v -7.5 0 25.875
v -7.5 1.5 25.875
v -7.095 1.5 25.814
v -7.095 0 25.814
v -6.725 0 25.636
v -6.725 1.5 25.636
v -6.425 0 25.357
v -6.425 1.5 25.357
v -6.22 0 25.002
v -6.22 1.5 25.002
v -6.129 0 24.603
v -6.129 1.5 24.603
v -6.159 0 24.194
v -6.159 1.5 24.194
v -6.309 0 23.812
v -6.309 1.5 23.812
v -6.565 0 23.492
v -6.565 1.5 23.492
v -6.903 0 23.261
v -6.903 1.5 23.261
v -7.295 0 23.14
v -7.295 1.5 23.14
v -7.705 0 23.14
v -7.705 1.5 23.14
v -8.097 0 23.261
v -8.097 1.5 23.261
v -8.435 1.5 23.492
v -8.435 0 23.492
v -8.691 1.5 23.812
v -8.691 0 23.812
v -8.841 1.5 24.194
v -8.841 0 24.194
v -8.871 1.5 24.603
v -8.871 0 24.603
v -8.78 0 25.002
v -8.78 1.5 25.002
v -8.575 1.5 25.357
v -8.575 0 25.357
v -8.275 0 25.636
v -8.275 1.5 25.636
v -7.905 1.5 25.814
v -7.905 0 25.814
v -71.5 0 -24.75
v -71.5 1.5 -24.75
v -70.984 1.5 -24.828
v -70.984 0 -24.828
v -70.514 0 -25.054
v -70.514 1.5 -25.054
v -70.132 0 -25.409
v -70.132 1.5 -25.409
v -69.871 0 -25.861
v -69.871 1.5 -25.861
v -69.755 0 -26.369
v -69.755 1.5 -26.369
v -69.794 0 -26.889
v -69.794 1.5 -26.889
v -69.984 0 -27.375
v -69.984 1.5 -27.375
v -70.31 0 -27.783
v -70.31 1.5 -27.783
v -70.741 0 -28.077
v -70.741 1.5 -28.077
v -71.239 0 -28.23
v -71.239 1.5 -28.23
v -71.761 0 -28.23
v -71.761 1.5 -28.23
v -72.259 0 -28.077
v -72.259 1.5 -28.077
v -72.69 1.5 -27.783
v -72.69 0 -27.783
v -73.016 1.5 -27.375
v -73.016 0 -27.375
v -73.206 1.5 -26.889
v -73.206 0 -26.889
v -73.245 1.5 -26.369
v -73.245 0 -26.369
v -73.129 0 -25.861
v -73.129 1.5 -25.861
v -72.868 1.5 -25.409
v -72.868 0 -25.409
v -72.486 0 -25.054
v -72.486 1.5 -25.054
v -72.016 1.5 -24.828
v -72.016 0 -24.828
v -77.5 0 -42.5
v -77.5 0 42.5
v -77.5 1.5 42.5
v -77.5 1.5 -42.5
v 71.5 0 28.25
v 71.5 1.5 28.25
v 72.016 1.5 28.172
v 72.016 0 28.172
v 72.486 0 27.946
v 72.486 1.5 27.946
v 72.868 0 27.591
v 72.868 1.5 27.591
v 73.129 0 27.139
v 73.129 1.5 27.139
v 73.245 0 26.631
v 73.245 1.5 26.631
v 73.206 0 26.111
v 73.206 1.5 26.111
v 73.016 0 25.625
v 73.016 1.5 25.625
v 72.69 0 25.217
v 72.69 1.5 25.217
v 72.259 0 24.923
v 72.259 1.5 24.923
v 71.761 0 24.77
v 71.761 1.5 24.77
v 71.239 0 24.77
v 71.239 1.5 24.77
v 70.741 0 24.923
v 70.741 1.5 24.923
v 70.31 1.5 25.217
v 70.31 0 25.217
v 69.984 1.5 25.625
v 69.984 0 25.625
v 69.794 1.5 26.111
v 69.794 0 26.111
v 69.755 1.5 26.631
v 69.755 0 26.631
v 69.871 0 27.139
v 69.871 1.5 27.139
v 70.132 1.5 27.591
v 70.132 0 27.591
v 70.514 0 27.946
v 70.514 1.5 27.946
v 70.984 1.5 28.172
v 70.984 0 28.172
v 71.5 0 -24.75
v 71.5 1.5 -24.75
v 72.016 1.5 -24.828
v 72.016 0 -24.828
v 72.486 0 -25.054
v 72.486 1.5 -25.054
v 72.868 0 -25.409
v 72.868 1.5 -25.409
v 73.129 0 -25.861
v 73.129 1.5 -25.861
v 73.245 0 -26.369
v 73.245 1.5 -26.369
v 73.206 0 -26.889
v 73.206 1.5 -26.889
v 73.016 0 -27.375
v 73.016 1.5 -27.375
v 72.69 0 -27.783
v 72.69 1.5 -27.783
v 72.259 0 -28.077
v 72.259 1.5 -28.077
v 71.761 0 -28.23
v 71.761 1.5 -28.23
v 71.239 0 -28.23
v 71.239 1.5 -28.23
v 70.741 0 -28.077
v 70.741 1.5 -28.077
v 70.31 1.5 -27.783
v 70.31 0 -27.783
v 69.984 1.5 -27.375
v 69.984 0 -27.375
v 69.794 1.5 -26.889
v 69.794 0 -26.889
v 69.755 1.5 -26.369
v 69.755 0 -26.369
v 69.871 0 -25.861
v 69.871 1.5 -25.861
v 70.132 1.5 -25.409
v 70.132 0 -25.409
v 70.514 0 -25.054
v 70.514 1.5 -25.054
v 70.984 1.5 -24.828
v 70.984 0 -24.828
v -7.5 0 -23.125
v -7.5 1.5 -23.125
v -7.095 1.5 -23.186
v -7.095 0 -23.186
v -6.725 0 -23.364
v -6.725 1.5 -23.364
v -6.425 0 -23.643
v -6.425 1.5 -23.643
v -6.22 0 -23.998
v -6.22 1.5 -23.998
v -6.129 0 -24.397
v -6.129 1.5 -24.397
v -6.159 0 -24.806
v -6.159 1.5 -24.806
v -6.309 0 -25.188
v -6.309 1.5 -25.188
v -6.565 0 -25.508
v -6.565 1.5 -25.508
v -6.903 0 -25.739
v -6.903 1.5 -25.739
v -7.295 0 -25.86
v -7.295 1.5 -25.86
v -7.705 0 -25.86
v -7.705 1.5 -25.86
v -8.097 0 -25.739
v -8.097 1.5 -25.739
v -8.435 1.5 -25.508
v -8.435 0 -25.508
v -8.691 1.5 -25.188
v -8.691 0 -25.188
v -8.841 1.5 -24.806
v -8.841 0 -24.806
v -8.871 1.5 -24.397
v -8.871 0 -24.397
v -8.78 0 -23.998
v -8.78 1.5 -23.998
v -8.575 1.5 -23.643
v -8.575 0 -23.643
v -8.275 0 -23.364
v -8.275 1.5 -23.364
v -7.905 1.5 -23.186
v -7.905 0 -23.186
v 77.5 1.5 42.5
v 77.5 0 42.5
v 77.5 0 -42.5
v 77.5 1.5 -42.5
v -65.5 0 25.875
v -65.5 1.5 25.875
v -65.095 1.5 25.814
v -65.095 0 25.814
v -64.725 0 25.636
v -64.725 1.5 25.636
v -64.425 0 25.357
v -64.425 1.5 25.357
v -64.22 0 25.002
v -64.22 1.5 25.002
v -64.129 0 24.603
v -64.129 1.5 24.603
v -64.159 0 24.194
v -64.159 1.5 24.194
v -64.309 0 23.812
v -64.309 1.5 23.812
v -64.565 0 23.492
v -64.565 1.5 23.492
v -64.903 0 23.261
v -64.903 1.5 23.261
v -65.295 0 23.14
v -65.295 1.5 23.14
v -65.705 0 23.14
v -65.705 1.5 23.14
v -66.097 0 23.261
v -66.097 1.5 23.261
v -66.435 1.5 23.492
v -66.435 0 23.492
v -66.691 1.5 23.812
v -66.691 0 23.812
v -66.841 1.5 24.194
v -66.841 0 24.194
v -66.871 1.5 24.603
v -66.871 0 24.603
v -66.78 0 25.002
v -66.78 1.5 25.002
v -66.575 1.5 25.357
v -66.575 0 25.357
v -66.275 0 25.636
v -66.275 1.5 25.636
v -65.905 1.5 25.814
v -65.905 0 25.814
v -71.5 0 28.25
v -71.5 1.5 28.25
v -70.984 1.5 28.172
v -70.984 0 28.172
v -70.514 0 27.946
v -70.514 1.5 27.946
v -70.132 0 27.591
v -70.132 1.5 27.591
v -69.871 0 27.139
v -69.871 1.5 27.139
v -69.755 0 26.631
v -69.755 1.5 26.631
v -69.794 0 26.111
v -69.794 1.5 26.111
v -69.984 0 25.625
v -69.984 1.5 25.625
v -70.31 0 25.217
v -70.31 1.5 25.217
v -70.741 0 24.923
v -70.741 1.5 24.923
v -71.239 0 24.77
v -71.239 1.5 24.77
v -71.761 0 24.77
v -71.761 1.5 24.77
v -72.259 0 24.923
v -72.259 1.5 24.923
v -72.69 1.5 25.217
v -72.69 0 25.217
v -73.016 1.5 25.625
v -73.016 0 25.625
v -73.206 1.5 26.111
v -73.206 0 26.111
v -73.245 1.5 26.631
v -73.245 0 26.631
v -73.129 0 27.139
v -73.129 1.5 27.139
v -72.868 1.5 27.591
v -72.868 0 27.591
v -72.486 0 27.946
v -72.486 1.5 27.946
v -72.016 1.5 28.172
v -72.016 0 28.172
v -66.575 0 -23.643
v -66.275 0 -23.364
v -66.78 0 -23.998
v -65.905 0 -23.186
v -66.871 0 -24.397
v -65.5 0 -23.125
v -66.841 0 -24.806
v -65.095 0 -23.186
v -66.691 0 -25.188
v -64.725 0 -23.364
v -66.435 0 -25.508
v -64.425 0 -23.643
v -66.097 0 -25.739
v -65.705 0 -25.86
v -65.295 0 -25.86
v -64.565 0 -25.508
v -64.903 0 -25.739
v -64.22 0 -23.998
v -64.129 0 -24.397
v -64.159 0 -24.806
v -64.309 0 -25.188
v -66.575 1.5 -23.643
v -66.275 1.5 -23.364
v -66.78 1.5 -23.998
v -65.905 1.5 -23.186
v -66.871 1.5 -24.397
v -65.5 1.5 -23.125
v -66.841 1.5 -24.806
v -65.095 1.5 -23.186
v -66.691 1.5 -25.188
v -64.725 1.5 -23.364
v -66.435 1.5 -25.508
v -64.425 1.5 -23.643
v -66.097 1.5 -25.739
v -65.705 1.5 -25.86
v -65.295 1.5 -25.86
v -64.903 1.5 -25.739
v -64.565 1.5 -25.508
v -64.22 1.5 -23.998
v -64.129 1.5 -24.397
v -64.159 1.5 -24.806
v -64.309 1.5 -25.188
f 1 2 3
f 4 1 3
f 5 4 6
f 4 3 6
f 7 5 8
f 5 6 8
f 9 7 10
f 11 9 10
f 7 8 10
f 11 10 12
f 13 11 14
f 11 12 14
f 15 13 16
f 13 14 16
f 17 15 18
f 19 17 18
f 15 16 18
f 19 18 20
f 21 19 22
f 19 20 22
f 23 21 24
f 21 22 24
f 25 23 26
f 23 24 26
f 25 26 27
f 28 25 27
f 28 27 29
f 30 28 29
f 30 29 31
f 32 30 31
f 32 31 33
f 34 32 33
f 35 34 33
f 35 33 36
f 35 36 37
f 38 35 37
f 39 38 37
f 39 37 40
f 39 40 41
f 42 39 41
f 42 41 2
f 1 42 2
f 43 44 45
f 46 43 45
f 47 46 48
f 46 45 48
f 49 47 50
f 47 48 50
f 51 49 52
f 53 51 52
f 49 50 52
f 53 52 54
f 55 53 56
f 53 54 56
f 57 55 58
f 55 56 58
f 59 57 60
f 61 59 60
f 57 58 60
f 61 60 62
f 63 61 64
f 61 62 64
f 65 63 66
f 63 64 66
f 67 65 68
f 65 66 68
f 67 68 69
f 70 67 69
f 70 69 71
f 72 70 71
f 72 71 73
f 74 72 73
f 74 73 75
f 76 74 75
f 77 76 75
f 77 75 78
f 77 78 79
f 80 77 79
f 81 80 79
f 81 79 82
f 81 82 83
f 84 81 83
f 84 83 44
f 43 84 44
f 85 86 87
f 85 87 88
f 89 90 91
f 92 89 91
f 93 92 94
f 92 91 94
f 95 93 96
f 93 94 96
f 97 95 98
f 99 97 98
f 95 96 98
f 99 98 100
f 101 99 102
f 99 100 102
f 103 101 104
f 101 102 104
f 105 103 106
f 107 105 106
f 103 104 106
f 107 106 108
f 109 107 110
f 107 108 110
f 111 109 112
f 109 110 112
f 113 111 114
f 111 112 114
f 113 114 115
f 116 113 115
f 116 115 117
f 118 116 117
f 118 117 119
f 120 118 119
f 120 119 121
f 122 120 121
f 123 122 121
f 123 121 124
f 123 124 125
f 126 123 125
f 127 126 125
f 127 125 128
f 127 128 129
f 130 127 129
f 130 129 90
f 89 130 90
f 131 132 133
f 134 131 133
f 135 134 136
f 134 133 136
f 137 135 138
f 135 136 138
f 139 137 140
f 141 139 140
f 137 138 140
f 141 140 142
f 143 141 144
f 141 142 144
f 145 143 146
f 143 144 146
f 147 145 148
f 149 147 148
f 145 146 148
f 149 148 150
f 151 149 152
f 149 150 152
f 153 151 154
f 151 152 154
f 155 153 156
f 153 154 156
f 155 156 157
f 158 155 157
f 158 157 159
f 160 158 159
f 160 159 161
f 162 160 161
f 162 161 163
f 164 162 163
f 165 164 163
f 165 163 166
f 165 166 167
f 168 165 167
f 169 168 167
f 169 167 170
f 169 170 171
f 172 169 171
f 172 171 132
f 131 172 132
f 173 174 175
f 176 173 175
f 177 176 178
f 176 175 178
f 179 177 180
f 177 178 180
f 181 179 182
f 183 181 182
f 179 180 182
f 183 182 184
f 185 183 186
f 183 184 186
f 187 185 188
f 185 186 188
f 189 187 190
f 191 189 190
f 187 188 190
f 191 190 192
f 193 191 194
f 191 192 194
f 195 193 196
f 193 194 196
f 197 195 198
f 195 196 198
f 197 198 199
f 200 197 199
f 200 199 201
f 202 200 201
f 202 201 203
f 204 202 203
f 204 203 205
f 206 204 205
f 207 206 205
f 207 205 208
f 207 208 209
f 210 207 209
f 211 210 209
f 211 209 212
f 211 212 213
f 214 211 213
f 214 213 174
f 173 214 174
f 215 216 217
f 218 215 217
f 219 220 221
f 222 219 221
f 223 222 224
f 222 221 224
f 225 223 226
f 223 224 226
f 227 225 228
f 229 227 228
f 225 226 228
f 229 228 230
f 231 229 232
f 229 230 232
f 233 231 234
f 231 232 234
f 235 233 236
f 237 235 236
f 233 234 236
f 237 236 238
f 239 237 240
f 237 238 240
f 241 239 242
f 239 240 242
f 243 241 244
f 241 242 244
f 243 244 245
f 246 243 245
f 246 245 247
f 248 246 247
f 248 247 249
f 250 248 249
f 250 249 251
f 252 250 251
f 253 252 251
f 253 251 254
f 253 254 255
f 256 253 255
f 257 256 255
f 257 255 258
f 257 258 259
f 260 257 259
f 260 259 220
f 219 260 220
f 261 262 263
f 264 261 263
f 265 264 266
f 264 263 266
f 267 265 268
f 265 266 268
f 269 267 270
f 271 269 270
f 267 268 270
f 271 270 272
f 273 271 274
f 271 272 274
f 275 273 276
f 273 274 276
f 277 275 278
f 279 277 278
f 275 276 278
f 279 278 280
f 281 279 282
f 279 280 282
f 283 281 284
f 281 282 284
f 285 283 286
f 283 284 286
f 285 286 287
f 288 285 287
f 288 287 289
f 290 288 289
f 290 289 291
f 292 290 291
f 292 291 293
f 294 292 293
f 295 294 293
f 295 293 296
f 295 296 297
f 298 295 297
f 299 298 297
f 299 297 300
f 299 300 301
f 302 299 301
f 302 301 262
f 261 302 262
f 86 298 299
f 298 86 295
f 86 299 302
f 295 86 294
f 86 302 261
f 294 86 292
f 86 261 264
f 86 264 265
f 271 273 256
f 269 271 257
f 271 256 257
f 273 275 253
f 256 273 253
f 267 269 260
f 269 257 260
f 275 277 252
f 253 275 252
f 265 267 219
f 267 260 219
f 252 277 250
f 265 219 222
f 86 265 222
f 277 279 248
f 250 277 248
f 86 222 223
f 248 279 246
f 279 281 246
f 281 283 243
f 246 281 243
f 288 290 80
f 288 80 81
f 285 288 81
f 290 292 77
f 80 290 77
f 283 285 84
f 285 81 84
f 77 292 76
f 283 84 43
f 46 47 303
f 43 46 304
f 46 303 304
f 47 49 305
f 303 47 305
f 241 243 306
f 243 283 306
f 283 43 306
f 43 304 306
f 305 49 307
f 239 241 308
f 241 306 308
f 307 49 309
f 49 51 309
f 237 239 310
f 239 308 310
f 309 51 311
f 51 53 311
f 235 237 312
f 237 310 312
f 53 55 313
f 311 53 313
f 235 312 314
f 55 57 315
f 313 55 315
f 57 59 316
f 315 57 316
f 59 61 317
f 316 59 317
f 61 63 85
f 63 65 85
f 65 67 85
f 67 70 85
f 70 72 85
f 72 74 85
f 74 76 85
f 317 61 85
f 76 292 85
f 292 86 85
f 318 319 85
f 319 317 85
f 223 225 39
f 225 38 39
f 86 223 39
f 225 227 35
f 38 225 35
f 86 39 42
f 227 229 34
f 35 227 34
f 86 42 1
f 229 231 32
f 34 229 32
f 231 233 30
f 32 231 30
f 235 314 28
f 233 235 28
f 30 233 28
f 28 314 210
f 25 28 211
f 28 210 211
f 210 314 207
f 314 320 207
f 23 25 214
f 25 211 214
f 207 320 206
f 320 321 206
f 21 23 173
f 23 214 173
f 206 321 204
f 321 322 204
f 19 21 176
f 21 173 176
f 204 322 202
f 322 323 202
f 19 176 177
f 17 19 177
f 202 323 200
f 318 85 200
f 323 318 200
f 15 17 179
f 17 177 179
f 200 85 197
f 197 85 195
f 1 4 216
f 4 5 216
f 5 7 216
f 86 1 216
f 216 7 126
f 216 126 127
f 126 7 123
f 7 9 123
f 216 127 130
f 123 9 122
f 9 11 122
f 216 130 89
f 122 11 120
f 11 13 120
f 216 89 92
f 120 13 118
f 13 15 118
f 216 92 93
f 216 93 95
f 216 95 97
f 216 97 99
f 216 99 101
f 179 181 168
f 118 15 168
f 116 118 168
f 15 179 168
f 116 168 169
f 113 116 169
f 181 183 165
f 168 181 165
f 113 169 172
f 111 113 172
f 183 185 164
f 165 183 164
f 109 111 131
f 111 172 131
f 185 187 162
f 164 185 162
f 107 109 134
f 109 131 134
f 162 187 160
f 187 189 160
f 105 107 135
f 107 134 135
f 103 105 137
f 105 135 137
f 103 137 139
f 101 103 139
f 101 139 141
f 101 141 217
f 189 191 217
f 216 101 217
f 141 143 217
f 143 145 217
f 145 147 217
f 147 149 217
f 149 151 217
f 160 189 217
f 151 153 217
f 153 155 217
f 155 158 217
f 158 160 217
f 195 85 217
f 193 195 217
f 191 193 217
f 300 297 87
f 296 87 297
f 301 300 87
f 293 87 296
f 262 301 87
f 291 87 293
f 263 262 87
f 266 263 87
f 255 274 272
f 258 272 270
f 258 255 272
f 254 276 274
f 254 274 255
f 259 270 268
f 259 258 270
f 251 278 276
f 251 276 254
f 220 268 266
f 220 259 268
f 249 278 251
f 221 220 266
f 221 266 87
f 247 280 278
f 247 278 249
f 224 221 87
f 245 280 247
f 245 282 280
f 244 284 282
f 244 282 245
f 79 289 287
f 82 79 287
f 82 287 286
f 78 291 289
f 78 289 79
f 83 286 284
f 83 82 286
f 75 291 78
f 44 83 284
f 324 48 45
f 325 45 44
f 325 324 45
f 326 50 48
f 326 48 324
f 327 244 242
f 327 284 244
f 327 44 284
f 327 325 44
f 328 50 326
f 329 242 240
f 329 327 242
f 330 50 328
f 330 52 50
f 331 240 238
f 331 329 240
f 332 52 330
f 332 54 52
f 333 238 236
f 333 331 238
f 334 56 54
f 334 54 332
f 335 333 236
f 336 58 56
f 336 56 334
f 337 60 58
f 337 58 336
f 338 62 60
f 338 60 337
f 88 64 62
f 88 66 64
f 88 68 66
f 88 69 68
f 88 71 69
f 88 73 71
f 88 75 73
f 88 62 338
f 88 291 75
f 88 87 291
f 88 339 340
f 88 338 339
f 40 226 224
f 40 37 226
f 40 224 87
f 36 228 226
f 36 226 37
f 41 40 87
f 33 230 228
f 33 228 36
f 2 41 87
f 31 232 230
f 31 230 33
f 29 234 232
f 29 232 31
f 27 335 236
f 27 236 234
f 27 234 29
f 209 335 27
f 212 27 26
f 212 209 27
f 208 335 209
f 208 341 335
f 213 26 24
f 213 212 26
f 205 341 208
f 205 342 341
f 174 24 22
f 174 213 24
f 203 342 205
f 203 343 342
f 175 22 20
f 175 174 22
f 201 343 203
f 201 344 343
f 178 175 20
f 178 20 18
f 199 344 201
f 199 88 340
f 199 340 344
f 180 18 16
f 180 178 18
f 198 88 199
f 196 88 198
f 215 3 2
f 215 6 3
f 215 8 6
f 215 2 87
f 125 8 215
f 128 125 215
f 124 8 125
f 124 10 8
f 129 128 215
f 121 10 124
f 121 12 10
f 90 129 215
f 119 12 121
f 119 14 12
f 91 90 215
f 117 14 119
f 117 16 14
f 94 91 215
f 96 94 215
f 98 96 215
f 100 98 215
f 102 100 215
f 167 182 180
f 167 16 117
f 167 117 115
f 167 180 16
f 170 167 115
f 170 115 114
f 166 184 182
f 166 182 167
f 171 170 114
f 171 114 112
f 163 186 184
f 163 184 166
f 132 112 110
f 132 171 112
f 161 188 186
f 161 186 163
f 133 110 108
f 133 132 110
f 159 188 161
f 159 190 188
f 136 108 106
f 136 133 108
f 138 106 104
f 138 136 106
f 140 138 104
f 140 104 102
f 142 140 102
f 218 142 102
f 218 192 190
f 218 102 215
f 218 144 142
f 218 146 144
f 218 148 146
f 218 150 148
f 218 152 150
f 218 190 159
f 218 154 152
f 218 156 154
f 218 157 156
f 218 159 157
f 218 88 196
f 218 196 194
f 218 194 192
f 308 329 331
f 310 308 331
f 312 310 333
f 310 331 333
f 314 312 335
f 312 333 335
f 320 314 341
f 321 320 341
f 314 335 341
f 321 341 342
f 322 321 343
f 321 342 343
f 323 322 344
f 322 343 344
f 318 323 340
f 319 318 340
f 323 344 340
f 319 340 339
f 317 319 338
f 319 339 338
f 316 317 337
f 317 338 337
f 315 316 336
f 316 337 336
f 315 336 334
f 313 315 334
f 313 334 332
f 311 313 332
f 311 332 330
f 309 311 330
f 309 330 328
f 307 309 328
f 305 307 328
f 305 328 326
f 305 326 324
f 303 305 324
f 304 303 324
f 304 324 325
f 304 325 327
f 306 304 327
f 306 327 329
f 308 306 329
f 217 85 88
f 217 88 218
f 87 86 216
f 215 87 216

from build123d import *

# Parameters (mm, degrees)
SKETCH_1_W          = 155
SKETCH_1_H          = 85
EXTRUDE_1_DEPTH     = 1.5
SKETCH_2_R          = 1.75
CUT_EXTRUDE_1_DEPTH = 89.401074654
SKETCH_3_R          = 1.375
CUT_EXTRUDE_2_DEPTH = 10


with BuildPart() as part:
    # Эскиз1 → Бобышка-Вытянуть1 (new body)
    with BuildSketch(Plane(origin=(0, 0, 0), x_dir=(1, 0, 0), z_dir=(0, 1, 0))):
        Rectangle(SKETCH_1_W, SKETCH_1_H)
    extrude(amount=EXTRUDE_1_DEPTH)

    # Эскиз2 → Вырез-Вытянуть1 (cut, through all)
    with BuildSketch(Plane(origin=(0, 1.5, 0), x_dir=(1, 0, 0), z_dir=(0, 1, 0))):
        with Locations(Location((-71.5, 26.5, 0), (0, 0, 270))):
            Circle(SKETCH_2_R)
        with Locations(Location((-71.5, -26.5, 0), (0, 0, 270))):
            Circle(SKETCH_2_R)
        with Locations(Location((71.5, -26.5, 0), (0, 0, 270))):
            Circle(SKETCH_2_R)
        with Locations(Location((71.5, 26.5, 0), (0, 0, 270))):
            Circle(SKETCH_2_R)
    extrude(amount=-CUT_EXTRUDE_1_DEPTH, mode=Mode.SUBTRACT)

    # Эскиз3 → Вырез-Вытянуть2 (cut)
    with BuildSketch(Plane(origin=(0, 1.5, 0), x_dir=(1, 0, 0), z_dir=(0, 1, 0))):
        with Locations(Location((-65.5, 24.5, 0), (0, 0, 270))):
            Circle(SKETCH_3_R)
        with Locations(Location((-65.5, -24.5, 0), (0, 0, 270))):
            Circle(SKETCH_3_R)
        with Locations(Location((-7.5, 24.5, 0), (0, 0, 270))):
            Circle(SKETCH_3_R)
        with Locations(Location((-7.5, -24.5, 0), (0, 0, 270))):
            Circle(SKETCH_3_R)
    extrude(amount=-CUT_EXTRUDE_2_DEPTH, mode=Mode.SUBTRACT)


solid = part.part
